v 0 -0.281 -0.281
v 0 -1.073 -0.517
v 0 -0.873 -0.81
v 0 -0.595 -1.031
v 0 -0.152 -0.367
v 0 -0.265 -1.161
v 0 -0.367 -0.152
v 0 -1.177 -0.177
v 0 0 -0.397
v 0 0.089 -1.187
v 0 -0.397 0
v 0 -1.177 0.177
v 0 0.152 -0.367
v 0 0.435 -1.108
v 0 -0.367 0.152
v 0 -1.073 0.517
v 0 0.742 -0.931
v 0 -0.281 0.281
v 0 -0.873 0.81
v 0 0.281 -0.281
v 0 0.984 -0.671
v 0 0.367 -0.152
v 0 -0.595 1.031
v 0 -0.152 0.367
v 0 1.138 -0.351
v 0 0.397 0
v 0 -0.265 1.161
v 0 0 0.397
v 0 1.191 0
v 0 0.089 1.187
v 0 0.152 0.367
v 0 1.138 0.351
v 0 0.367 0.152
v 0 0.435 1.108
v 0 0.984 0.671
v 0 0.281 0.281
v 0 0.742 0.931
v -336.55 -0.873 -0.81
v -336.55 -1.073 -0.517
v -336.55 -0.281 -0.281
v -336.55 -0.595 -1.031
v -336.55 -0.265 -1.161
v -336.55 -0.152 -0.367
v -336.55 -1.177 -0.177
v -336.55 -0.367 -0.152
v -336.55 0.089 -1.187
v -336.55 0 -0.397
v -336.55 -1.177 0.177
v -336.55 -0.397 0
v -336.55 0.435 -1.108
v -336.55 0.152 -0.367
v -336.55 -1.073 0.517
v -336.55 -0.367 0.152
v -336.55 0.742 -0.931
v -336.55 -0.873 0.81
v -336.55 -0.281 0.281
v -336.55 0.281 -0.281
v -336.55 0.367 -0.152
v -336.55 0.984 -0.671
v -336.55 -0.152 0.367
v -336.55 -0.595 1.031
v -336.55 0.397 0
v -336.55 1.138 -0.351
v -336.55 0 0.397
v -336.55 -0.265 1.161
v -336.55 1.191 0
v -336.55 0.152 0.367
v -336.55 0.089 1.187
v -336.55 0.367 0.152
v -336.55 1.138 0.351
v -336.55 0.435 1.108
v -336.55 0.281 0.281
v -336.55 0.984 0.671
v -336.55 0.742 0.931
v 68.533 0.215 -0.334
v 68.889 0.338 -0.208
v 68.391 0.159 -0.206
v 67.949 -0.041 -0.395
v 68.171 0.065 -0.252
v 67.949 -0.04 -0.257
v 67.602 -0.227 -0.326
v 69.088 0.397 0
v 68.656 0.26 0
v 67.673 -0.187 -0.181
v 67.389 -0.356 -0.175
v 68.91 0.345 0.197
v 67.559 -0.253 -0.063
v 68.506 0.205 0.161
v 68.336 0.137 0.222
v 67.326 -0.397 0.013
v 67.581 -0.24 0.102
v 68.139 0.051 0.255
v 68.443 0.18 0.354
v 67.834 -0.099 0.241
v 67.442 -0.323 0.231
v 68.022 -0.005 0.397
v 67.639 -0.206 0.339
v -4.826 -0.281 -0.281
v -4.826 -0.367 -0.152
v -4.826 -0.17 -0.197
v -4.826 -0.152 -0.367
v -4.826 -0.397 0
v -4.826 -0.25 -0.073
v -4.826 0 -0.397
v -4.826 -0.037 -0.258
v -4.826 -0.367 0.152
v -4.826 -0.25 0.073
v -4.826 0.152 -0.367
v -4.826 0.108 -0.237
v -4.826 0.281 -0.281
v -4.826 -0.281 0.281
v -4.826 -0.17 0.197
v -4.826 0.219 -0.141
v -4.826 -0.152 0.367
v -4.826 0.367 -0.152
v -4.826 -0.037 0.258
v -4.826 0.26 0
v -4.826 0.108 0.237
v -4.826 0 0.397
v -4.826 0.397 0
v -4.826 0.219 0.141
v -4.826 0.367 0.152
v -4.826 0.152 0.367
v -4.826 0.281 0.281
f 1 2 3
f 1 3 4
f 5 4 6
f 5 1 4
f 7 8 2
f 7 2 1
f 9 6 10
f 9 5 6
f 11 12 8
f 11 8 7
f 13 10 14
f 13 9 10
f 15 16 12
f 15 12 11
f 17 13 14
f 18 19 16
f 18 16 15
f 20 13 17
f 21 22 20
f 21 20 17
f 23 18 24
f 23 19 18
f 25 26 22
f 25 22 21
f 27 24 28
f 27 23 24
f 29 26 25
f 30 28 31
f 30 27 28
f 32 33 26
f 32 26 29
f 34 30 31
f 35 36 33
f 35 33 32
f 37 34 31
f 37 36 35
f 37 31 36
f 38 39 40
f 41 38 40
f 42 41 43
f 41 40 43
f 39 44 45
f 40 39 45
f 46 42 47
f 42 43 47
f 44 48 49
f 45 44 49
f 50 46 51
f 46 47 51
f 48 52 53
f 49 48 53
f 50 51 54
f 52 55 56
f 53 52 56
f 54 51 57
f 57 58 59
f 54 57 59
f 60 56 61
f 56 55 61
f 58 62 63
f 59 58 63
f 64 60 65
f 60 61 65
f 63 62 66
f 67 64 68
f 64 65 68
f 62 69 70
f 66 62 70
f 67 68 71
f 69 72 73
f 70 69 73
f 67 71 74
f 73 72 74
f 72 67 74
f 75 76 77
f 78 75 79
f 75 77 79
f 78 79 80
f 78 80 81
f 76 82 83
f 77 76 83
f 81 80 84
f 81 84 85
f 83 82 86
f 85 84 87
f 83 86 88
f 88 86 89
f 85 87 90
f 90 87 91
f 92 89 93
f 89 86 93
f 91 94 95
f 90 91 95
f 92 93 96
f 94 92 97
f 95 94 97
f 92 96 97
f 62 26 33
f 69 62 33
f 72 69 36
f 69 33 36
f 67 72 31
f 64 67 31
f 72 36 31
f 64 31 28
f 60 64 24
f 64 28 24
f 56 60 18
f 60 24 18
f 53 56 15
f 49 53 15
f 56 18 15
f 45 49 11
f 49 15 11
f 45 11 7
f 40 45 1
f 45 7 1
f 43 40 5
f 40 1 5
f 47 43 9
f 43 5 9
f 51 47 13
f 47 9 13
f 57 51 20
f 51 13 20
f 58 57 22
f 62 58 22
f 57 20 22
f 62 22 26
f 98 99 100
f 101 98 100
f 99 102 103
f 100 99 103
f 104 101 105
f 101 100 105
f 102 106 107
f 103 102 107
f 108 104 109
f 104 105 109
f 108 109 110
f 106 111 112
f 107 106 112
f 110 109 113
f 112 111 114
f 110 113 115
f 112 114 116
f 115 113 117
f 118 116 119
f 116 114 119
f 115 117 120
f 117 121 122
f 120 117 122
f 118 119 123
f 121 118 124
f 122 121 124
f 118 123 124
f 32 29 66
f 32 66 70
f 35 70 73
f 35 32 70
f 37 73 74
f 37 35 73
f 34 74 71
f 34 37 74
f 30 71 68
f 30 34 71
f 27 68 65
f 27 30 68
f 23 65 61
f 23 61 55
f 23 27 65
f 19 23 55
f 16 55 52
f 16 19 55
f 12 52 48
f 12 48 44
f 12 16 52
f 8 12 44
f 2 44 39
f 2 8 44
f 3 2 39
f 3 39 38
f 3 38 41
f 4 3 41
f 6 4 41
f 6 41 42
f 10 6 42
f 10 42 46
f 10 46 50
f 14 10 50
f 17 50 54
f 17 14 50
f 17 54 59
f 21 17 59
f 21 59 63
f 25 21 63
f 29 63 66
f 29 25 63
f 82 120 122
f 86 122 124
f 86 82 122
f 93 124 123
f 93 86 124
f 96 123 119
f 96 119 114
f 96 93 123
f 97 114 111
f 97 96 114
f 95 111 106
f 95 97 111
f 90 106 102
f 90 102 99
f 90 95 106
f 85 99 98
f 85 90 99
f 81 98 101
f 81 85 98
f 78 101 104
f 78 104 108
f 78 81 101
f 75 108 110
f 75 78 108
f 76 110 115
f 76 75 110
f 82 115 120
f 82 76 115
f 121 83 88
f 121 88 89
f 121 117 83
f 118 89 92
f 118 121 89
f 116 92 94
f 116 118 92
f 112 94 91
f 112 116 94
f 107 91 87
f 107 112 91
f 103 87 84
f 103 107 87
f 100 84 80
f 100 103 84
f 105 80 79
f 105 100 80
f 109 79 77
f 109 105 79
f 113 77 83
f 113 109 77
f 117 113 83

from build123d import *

# Parameters (mm, degrees)
F0_R          = 1.190625
F0_R_2        = 0.396875
F1_DEPTH      = 336.55
F2_R          = 0.396875
F2_R_2        = 0.26035
F3_DEPTH      = 69.088
F3_DEPTH_BACK = 4.826
F5_DEPTH      = 12.7


with BuildPart() as f1:
    # F0 (on Right) → F1 (new body)
    with BuildSketch(Plane.YZ):
        Circle(F0_R)
        Circle(F0_R_2, mode=Mode.SUBTRACT)
    extrude(amount=-F1_DEPTH)


with BuildPart() as f3:
    # F2 (on face) → F3 (new body, two sides)
    with BuildSketch(Plane.YZ) as f3_sk:
        Circle(F2_R)
        Circle(F2_R_2, mode=Mode.SUBTRACT)
    extrude(amount=F3_DEPTH)
    extrude(f3_sk.sketch, amount=-F3_DEPTH_BACK)

    # F4 (on Top) → F5 (cut, symmetric)
    with BuildSketch(Plane.XY):
        with BuildLine():
            Line((69.088, -0.492125), (69.088, 0.396875))
            ThreePointArc((69.088, 0.396875), (68.098456, 0.031756), (67.183, -0.492125))
            Line((67.183, -0.492125), (69.088, -0.492125))
        make_face()
    extrude(amount=F5_DEPTH, both=True, mode=Mode.SUBTRACT)


solid = Compound([f1.part, f3.part])
